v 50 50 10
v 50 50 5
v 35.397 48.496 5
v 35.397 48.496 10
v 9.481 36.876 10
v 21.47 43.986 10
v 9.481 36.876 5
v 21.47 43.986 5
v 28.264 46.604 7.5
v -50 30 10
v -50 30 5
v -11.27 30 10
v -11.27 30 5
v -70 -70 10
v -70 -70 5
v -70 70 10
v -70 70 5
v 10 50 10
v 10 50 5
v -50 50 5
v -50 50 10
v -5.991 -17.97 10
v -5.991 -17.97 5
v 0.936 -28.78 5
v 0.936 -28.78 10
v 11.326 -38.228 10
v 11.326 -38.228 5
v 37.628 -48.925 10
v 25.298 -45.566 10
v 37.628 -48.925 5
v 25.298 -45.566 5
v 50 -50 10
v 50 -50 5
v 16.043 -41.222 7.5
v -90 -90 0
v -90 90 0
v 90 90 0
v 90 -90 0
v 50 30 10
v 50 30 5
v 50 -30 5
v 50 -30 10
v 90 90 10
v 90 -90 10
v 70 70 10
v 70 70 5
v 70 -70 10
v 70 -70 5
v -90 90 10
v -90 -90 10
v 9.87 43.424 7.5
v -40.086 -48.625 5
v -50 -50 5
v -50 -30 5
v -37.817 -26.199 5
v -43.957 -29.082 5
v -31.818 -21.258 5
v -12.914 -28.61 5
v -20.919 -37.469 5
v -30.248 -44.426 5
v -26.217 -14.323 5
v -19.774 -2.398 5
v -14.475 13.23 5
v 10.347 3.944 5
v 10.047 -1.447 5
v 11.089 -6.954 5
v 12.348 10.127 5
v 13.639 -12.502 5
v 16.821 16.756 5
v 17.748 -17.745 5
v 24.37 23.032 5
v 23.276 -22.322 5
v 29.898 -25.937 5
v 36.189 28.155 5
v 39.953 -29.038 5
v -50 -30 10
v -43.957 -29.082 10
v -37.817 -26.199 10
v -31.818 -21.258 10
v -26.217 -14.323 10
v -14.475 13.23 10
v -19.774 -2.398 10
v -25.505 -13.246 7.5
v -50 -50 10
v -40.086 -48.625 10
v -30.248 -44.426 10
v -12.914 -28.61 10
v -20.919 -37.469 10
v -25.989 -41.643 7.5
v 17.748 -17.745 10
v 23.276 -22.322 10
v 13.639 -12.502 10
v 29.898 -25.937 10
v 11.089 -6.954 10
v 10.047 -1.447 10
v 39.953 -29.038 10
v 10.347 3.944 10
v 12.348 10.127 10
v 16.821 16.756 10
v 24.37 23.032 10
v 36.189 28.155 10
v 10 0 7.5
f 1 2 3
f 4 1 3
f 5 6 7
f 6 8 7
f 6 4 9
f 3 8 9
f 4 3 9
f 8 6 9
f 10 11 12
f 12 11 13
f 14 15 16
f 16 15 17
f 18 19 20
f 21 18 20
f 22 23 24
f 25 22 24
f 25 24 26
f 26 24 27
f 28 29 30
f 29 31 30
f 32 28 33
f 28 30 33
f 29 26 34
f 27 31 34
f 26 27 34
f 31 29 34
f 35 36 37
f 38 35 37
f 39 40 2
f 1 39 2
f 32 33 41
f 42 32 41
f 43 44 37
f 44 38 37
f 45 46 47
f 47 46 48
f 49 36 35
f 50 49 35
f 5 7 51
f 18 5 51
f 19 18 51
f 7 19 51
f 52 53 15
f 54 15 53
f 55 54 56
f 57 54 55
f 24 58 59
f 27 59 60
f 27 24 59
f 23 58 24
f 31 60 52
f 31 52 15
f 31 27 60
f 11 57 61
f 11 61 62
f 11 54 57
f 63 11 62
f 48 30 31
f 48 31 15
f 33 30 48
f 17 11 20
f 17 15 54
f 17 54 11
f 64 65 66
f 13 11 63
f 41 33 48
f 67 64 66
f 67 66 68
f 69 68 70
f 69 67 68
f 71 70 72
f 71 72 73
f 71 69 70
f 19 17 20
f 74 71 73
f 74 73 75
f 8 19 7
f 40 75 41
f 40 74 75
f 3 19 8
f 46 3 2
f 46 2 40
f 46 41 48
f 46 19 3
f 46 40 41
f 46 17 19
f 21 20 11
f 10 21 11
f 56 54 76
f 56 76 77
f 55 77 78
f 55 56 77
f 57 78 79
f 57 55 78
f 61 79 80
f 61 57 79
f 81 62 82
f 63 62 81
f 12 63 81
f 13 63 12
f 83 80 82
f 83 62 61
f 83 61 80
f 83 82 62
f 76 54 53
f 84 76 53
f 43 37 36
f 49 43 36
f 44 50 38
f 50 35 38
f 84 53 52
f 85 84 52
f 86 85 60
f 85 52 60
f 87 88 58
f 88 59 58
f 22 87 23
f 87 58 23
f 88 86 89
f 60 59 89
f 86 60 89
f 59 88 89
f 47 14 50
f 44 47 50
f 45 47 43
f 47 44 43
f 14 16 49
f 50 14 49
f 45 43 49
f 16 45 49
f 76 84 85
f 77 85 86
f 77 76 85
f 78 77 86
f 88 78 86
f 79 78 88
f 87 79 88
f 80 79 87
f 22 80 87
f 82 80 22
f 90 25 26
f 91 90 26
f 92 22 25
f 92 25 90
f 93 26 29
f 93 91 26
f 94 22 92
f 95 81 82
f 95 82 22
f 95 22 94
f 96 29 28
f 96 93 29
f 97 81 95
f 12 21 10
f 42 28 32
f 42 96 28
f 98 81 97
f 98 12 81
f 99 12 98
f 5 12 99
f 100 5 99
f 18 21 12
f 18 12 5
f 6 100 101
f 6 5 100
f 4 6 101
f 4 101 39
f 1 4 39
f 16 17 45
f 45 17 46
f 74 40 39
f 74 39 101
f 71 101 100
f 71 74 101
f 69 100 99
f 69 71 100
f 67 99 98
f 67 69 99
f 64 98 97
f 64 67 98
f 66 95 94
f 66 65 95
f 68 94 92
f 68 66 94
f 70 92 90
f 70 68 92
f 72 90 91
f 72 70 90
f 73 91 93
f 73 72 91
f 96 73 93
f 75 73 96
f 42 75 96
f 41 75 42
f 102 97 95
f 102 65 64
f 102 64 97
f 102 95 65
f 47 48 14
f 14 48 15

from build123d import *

# Parameters (mm, degrees)
F0_W     = 180
F0_H     = 180
F1_DEPTH = 5
F3_DEPTH = 5


with BuildPart() as f1:
    # F0 (on Top) → F1 (new body)
    with BuildSketch(Plane.XY):
        Rectangle(F0_W, F0_H)
    extrude(amount=F1_DEPTH)

    # F2 (on face) → F3 (join)
    with BuildSketch(Plane.XY.offset(5)):
        with BuildLine():
            add(Edge.make_bspline(
                [(-84.6410161514, 90), (-90, 71.4359353945), (-90, 50)],
                knots=[4.1887902048, 4.1887902048, 4.1887902048, 4.7123889804, 4.7123889804, 4.7123889804], degree=2, weights=[1, 0.9659258263, 1]))
            Line((-84.6410161514, 90), (-90, 90))
            Line((-90, 90), (-90, 50))
        make_face()
        with BuildLine():
            add(Edge.make_bspline(
                [(-11.2701665379, 70), (-12.6331056415, 80.5572809), (-15.3589838486, 90)],
                knots=[1.8234765819, 1.8234765819, 1.8234765819, 2.0943951024, 2.0943951024, 2.0943951024], degree=2, weights=[1, 0.9908394147, 1]))
            Line((-15.3589838486, 90), (-84.6410161514, 90))
            add(Edge.make_bspline(
                [(-84.6410161514, 90), (-90, 71.4359353945), (-90, 50)],
                knots=[4.1887902048, 4.1887902048, 4.1887902048, 4.7123889804, 4.7123889804, 4.7123889804], degree=2, weights=[1, 0.9659258263, 1]))
            add(Edge.make_bspline(
                [(-90, 50), (-90, 3.8119784648), (-70, -19.2820323028)],
                knots=[4.7123889804, 4.7123889804, 4.7123889804, 5.7595865316, 5.7595865316, 5.7595865316], degree=2, weights=[1, 0.8660254038, 1]))
            Line((-70, -19.2820323028), (-70, 70))
            Line((-70, 70), (-11.2701665379, 70))
        make_face()
        with BuildLine():
            add(Edge.make_bspline(
                [(8.7877538268, 70), (7.5221386644, 80.333704529), (4.9909083395, 90)],
                knots=[4.9137469012, 4.9137469012, 4.9137469012, 5.1239058265, 5.1239058265, 5.1239058265], degree=2, weights=[1, 0.9944842314, 1]))
            Line((4.9909083395, 90), (-15.3589838486, 90))
            add(Edge.make_bspline(
                [(-11.2701665379, 70), (-12.6331056415, 80.5572809), (-15.3589838486, 90)],
                knots=[1.8234765819, 1.8234765819, 1.8234765819, 2.0943951024, 2.0943951024, 2.0943951024], degree=2, weights=[1, 0.9908394147, 1]))
            Line((-11.2701665379, 70), (8.7877538268, 70))
        make_face()
        with BuildLine():
            Line((90, 37.267799625), (90, 90))
            Line((90, 90), (4.9909083395, 90))
            add(Edge.make_bspline(
                [(8.7877538268, 70), (7.5221386644, 80.333704529), (4.9909083395, 90)],
                knots=[4.9137469012, 4.9137469012, 4.9137469012, 5.1239058265, 5.1239058265, 5.1239058265], degree=2, weights=[1, 0.9944842314, 1]))
            Line((8.7877538268, 70), (70, 70))
            Line((70, 70), (70, 47.1404520791))
            add(Edge.make_bspline(
                [(90, 37.267799625), (81.1696311978, 43.8495679277), (70, 47.1404520791)],
                knots=[3.9826613242, 3.9826613242, 3.9826613242, 4.3725520709, 4.3725520709, 4.3725520709], degree=2, weights=[1, 0.9810582529, 1]))
        make_face()
        with BuildLine():
            Line((90, -2.944e-07), (90, 37.267799625))
            add(Edge.make_bspline(
                [(90, 37.267799625), (81.1696311978, 43.8495679277), (70, 47.1404520791)],
                knots=[3.9826613242, 3.9826613242, 3.9826613242, 4.3725520709, 4.3725520709, 4.3725520709], degree=2, weights=[1, 0.9810582529, 1]))
            Line((70, 47.1404520791), (70, 25.9807621135))
            add(Edge.make_bspline(
                [(90, -2.944e-07), (90.0000002266, 17.3205079775), (70, 25.9807621135)],
                knots=[3.1415926438, 3.1415926438, 3.1415926438, 4.1887902048, 4.1887902048, 4.1887902048], degree=2, weights=[1, 0.8660254013, 1]))
        make_face()
        with BuildLine():
            add(Edge.make_bspline(
                [(70, -25.9807621135), (89.9999997734, -17.3205081738), (90, -2.944e-07)],
                knots=[2.0943951024, 2.0943951024, 2.0943951024, 3.1415926438, 3.1415926438, 3.1415926438], degree=2, weights=[1, 0.8660254062, 1]))
            add(Edge.make_bspline(
                [(90, -2.944e-07), (90.0000002266, 17.3205079775), (70, 25.9807621135)],
                knots=[3.1415926438, 3.1415926438, 3.1415926438, 4.1887902048, 4.1887902048, 4.1887902048], degree=2, weights=[1, 0.8660254013, 1]))
            Line((70, 25.9807621135), (70, -25.9807621135))
        make_face()
        with BuildLine():
            Line((90, -37.267799625), (90, -2.944e-07))
            add(Edge.make_bspline(
                [(70, -25.9807621135), (89.9999997734, -17.3205081738), (90, -2.944e-07)],
                knots=[2.0943951024, 2.0943951024, 2.0943951024, 3.1415926438, 3.1415926438, 3.1415926438], degree=2, weights=[1, 0.8660254062, 1]))
            Line((70, -25.9807621135), (70, -47.1404520791))
            add(Edge.make_bspline(
                [(70, -47.1404520791), (81.1696311978, -43.8495679277), (90, -37.267799625)],
                knots=[1.9106332362, 1.9106332362, 1.9106332362, 2.300523983, 2.300523983, 2.300523983], degree=2, weights=[1, 0.9810582529, 1]))
        make_face()
        with BuildLine():
            Line((-90, 50), (-90, -24.53559925))
            add(Edge.make_bspline(
                [(-90, -24.53559925), (-81.1696311978, -37.6991358555), (-70, -44.2809041582)],
                knots=[2.4118649974, 2.4118649974, 2.4118649974, 2.8017557441, 2.8017557441, 2.8017557441], degree=2, weights=[1, 0.9810582529, 1]))
            Line((-70, -44.2809041582), (-70, -19.2820323028))
            add(Edge.make_bspline(
                [(-90, 50), (-90, 3.8119784648), (-70, -19.2820323028)],
                knots=[4.7123889804, 4.7123889804, 4.7123889804, 5.7595865316, 5.7595865316, 5.7595865316], degree=2, weights=[1, 0.8660254038, 1]))
        make_face()
        with BuildLine():
            add(Edge.make_bspline(
                [(9.4810733311, 36.876450834), (10, 43.4097265114), (10, 50)],
                knots=[4.5807738328, 4.5807738328, 4.5807738328, 4.7123889804, 4.7123889804, 4.7123889804], degree=2, weights=[1, 0.9978354629, 1]))
            Line((10, 50), (0, 50))
            Line((0, 50), (0, 30))
            Line((0, 30), (-11.2701665379, 30))
            add(Edge.make_bspline(
                [(-50, -30), (-19.0161332303, -30), (-11.2701665379, 30)],
                knots=[0, 0, 0, 1.3181160717, 1.3181160717, 1.3181160717], degree=2, weights=[1, 0.790569415, 1]))
            Line((-50, -30), (-50, -50))
            add(Edge.make_bspline(
                [(-50, -50), (-23.7994473959, -50), (-5.9908211975, -17.9704221034)],
                knots=[3.1415926536, 3.1415926536, 3.1415926536, 3.9650296719, 3.9650296719, 3.9650296719], degree=2, weights=[1, 0.9164344551, 1]))
            add(Edge.make_bspline(
                [(9.4810733311, 36.876450834), (-20.6970548218, 13.8493839138), (-5.9908211975, -17.9704221034)],
                knots=[5.4537813034, 5.4537813034, 5.4537813034, 6.6508192072, 6.6508192072, 6.6508192072], degree=2, weights=[1, 0.8261709721, 1]))
        make_face()
        with BuildLine():
            Line((0, 50), (-10, 50))
            add(Edge.make_bspline(
                [(-11.2701665379, 30), (-10, 39.8386676966), (-10, 50)],
                knots=[1.3181160717, 1.3181160717, 1.3181160717, 1.5707963268, 1.5707963268, 1.5707963268], degree=2, weights=[1, 0.9920296963, 1]))
            Line((-11.2701665379, 30), (0, 30))
            Line((0, 30), (0, 50))
        make_face()
        with BuildLine():
            add(Edge.make_bspline(
                [(-11.2701665379, 30), (-10, 39.8386676966), (-10, 50)],
                knots=[1.3181160717, 1.3181160717, 1.3181160717, 1.5707963268, 1.5707963268, 1.5707963268], degree=2, weights=[1, 0.9920296963, 1]))
            Line((-10, 50), (-50, 50))
            Line((-50, 50), (-50, 30))
            Line((-50, 30), (-11.2701665379, 30))
        make_face()
        with BuildLine():
            Line((50, 30), (50, 50))
            add(Edge.make_bspline(
                [(50, 50), (26.6801438826, 50), (9.4810733311, 36.876450834)],
                knots=[4.7123889804, 4.7123889804, 4.7123889804, 5.4537813034, 5.4537813034, 5.4537813034], degree=2, weights=[1, 0.932075377, 1]))
            add(Edge.make_bspline(
                [(-5.9908211975, -17.9704221034), (6.9772353101, 5.3531836285), (9.4810733311, 36.876450834)],
                knots=[3.9650296719, 3.9650296719, 3.9650296719, 4.5807738328, 4.5807738328, 4.5807738328], degree=2, weights=[1, 0.9529805535, 1]))
            add(Edge.make_bspline(
                [(-5.9908211975, -17.9704221034), (8.8123631833, -50), (50, -50)],
                knots=[0.3676339, 0.3676339, 0.3676339, 1.5707963268, 1.5707963268, 1.5707963268], degree=2, weights=[1, 0.8244417633, 1]))
            Line((50, -50), (50, -30))
            add(Edge.make_bspline(
                [(10, 0), (10, -30), (50, -30)],
                knots=[0, 0, 0, 1.5707963268, 1.5707963268, 1.5707963268], degree=2, weights=[1, 0.7071067812, 1]))
            add(Edge.make_bspline(
                [(50, 30), (10, 30), (10, 0)],
                knots=[4.7123889804, 4.7123889804, 4.7123889804, 6.2831853072, 6.2831853072, 6.2831853072], degree=2, weights=[1, 0.7071067812, 1]))
        make_face()
        with BuildLine():
            add(Edge.make_bspline(
                [(-5.9908211975, -17.9704221034), (6.9772353101, 5.3531836285), (9.4810733311, 36.876450834)],
                knots=[3.9650296719, 3.9650296719, 3.9650296719, 4.5807738328, 4.5807738328, 4.5807738328], degree=2, weights=[1, 0.9529805535, 1]))
            add(Edge.make_bspline(
                [(9.4810733311, 36.876450834), (-20.6970548218, 13.8493839138), (-5.9908211975, -17.9704221034)],
                knots=[5.4537813034, 5.4537813034, 5.4537813034, 6.6508192072, 6.6508192072, 6.6508192072], degree=2, weights=[1, 0.8261709721, 1]))
        make_face()
        with BuildLine():
            Line((90, -90), (90, -37.267799625))
            add(Edge.make_bspline(
                [(70, -47.1404520791), (81.1696311978, -43.8495679277), (90, -37.267799625)],
                knots=[1.9106332362, 1.9106332362, 1.9106332362, 2.300523983, 2.300523983, 2.300523983], degree=2, weights=[1, 0.9810582529, 1]))
            Line((70, -47.1404520791), (70, -70))
            Line((70, -70), (-70, -70))
            Line((-70, -70), (-70, -44.2809041582))
            add(Edge.make_bspline(
                [(-90, -24.53559925), (-81.1696311978, -37.6991358555), (-70, -44.2809041582)],
                knots=[2.4118649974, 2.4118649974, 2.4118649974, 2.8017557441, 2.8017557441, 2.8017557441], degree=2, weights=[1, 0.9810582529, 1]))
            Line((-90, -24.53559925), (-90, -90))
            Line((-90, -90), (90, -90))
        make_face()
    extrude(amount=F3_DEPTH)


solid = f1.part
